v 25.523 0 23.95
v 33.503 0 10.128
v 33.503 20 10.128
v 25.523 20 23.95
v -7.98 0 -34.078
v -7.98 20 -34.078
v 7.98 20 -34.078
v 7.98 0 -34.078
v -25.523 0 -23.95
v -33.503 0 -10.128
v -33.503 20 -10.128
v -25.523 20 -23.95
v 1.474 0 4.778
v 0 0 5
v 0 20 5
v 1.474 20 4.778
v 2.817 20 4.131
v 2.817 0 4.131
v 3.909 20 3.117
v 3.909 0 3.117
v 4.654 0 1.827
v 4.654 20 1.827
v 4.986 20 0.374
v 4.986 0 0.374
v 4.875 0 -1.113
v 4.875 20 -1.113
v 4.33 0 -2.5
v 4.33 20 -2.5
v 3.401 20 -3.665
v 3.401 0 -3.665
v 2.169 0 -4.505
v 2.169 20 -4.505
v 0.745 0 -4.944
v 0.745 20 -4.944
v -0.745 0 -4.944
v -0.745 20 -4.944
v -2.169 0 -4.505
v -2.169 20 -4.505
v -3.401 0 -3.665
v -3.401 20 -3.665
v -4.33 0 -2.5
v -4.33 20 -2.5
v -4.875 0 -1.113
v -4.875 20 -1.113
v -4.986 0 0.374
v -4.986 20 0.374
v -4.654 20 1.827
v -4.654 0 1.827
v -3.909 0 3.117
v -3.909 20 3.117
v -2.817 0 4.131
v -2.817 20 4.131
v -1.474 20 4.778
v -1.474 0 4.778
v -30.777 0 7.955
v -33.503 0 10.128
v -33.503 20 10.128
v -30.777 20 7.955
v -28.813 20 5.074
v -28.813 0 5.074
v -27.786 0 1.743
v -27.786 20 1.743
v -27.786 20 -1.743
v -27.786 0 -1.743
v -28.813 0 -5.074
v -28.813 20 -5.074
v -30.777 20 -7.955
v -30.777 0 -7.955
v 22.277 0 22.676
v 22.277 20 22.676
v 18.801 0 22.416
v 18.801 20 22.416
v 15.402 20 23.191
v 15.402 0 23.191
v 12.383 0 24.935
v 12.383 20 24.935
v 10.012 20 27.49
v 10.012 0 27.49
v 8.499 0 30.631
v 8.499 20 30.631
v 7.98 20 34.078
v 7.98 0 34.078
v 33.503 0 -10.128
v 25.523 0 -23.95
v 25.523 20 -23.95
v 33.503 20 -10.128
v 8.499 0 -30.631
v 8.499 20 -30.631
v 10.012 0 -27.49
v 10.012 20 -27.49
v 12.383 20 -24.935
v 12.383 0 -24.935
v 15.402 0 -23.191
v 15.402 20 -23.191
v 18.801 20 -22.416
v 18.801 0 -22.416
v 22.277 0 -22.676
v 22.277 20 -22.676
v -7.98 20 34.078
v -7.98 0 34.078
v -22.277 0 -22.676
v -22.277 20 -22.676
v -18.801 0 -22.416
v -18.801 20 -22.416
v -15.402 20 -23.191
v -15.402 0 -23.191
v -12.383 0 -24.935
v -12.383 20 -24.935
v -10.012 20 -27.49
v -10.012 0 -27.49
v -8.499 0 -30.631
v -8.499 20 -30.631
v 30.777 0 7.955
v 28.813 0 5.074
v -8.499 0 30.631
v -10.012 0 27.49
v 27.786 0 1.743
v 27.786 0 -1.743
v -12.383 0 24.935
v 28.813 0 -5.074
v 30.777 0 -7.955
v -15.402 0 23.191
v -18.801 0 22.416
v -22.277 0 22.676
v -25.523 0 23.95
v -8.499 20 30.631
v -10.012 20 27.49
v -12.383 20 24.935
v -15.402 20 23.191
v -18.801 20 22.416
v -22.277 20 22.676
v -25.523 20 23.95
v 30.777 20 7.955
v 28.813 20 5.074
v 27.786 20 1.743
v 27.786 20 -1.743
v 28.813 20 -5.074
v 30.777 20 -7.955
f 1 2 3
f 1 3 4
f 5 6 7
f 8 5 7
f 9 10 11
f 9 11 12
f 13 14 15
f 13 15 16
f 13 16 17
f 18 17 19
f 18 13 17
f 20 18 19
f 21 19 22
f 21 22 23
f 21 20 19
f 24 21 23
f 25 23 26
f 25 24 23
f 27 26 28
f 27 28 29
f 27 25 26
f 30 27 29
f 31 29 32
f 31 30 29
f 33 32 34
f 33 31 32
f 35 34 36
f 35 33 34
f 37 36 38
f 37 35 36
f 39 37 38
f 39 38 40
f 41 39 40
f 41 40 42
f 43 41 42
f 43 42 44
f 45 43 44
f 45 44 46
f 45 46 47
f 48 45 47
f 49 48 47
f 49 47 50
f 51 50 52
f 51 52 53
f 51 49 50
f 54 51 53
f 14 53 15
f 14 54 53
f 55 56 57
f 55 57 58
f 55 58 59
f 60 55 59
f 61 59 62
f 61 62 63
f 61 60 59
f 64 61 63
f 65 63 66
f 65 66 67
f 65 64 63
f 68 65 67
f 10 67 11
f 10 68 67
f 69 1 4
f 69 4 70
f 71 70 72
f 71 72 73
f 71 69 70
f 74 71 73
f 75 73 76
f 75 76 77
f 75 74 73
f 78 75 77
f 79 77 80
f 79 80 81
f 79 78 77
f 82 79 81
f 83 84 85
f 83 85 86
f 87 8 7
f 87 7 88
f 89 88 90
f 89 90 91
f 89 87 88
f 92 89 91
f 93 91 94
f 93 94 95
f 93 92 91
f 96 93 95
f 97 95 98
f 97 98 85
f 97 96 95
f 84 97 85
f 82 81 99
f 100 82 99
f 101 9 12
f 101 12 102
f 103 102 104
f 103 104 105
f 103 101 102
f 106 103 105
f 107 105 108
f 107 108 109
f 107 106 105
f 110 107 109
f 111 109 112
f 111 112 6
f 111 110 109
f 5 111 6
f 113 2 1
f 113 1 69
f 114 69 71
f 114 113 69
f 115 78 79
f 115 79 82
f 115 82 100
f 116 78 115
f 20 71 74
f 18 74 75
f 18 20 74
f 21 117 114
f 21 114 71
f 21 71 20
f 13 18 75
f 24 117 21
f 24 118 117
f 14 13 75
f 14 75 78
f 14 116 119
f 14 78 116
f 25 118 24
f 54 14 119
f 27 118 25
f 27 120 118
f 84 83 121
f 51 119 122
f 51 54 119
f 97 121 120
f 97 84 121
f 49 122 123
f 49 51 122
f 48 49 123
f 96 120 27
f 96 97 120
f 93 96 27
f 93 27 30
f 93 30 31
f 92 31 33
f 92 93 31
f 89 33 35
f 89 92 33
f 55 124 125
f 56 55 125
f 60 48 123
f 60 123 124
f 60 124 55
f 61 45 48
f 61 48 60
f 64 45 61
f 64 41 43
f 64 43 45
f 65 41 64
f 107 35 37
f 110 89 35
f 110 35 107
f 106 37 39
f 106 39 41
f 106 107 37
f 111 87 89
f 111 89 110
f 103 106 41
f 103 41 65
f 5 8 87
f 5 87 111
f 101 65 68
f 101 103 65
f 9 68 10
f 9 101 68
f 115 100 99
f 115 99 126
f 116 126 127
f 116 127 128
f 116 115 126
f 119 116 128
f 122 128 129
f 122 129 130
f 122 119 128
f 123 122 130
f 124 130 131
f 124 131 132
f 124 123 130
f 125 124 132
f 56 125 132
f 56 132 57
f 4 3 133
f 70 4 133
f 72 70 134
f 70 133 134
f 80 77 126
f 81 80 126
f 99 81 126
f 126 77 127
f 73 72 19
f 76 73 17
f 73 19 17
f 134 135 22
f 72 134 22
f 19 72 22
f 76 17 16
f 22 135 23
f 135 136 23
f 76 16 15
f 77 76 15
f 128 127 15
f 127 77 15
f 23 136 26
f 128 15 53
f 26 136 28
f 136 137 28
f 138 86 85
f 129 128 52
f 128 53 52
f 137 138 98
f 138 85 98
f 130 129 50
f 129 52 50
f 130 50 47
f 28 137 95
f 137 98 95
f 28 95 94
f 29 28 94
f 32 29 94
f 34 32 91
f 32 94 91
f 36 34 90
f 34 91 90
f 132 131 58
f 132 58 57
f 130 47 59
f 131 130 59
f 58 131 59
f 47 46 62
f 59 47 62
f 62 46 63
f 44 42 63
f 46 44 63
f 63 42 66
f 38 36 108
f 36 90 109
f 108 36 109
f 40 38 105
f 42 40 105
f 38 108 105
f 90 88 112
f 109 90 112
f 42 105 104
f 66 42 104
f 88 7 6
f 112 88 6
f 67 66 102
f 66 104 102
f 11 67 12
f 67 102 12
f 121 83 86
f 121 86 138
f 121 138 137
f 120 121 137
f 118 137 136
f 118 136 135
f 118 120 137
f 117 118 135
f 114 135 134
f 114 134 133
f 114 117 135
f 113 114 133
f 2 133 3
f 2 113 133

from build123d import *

# Parameters (mm, degrees)
SKETCH1_R           = 5
BOSS_EXTRUDE1_DEPTH = 20


with BuildPart() as part:
    # Sketch1 → Boss-Extrude1 (new body)
    with BuildSketch(Plane(origin=(0, 0, 0), x_dir=(1, 0, 0), z_dir=(0, 1, 0))):
        with BuildLine():
            Line((-7.979897677, 34.078163581), (7.979897677, 34.078163581))
            ThreePointArc((7.979897677, 34.078163581), (13.827467297, 23.949875898), (25.522606537, 23.949875898))
            Line((25.522606537, 23.949875898), (33.502504214, 10.128287683))
            ThreePointArc((33.502504214, 10.128287683), (27.654934594, 0), (33.502504214, -10.128287683))
            Line((33.502504214, -10.128287683), (25.522606537, -23.949875898))
            ThreePointArc((25.522606537, -23.949875898), (13.827467297, -23.949875898), (7.979897677, -34.078163581))
            Line((7.979897677, -34.078163581), (-7.979897677, -34.078163581))
            ThreePointArc((-7.979897677, -34.078163581), (-13.827467297, -23.949875898), (-25.522606537, -23.949875898))
            Line((-25.522606537, -23.949875898), (-33.502504214, -10.128287683))
            ThreePointArc((-33.502504214, -10.128287683), (-27.654934594, 0), (-33.502504214, 10.128287683))
            Line((-33.502504214, 10.128287683), (-25.522606537, 23.949875898))
            ThreePointArc((-25.522606537, 23.949875898), (-13.827467297, 23.949875898), (-7.979897677, 34.078163581))
        make_face()
        with Locations(Location((0, 0, 0), (0, 0, 270))):
            Circle(SKETCH1_R, mode=Mode.SUBTRACT)
    extrude(amount=BOSS_EXTRUDE1_DEPTH)


solid = part.part
